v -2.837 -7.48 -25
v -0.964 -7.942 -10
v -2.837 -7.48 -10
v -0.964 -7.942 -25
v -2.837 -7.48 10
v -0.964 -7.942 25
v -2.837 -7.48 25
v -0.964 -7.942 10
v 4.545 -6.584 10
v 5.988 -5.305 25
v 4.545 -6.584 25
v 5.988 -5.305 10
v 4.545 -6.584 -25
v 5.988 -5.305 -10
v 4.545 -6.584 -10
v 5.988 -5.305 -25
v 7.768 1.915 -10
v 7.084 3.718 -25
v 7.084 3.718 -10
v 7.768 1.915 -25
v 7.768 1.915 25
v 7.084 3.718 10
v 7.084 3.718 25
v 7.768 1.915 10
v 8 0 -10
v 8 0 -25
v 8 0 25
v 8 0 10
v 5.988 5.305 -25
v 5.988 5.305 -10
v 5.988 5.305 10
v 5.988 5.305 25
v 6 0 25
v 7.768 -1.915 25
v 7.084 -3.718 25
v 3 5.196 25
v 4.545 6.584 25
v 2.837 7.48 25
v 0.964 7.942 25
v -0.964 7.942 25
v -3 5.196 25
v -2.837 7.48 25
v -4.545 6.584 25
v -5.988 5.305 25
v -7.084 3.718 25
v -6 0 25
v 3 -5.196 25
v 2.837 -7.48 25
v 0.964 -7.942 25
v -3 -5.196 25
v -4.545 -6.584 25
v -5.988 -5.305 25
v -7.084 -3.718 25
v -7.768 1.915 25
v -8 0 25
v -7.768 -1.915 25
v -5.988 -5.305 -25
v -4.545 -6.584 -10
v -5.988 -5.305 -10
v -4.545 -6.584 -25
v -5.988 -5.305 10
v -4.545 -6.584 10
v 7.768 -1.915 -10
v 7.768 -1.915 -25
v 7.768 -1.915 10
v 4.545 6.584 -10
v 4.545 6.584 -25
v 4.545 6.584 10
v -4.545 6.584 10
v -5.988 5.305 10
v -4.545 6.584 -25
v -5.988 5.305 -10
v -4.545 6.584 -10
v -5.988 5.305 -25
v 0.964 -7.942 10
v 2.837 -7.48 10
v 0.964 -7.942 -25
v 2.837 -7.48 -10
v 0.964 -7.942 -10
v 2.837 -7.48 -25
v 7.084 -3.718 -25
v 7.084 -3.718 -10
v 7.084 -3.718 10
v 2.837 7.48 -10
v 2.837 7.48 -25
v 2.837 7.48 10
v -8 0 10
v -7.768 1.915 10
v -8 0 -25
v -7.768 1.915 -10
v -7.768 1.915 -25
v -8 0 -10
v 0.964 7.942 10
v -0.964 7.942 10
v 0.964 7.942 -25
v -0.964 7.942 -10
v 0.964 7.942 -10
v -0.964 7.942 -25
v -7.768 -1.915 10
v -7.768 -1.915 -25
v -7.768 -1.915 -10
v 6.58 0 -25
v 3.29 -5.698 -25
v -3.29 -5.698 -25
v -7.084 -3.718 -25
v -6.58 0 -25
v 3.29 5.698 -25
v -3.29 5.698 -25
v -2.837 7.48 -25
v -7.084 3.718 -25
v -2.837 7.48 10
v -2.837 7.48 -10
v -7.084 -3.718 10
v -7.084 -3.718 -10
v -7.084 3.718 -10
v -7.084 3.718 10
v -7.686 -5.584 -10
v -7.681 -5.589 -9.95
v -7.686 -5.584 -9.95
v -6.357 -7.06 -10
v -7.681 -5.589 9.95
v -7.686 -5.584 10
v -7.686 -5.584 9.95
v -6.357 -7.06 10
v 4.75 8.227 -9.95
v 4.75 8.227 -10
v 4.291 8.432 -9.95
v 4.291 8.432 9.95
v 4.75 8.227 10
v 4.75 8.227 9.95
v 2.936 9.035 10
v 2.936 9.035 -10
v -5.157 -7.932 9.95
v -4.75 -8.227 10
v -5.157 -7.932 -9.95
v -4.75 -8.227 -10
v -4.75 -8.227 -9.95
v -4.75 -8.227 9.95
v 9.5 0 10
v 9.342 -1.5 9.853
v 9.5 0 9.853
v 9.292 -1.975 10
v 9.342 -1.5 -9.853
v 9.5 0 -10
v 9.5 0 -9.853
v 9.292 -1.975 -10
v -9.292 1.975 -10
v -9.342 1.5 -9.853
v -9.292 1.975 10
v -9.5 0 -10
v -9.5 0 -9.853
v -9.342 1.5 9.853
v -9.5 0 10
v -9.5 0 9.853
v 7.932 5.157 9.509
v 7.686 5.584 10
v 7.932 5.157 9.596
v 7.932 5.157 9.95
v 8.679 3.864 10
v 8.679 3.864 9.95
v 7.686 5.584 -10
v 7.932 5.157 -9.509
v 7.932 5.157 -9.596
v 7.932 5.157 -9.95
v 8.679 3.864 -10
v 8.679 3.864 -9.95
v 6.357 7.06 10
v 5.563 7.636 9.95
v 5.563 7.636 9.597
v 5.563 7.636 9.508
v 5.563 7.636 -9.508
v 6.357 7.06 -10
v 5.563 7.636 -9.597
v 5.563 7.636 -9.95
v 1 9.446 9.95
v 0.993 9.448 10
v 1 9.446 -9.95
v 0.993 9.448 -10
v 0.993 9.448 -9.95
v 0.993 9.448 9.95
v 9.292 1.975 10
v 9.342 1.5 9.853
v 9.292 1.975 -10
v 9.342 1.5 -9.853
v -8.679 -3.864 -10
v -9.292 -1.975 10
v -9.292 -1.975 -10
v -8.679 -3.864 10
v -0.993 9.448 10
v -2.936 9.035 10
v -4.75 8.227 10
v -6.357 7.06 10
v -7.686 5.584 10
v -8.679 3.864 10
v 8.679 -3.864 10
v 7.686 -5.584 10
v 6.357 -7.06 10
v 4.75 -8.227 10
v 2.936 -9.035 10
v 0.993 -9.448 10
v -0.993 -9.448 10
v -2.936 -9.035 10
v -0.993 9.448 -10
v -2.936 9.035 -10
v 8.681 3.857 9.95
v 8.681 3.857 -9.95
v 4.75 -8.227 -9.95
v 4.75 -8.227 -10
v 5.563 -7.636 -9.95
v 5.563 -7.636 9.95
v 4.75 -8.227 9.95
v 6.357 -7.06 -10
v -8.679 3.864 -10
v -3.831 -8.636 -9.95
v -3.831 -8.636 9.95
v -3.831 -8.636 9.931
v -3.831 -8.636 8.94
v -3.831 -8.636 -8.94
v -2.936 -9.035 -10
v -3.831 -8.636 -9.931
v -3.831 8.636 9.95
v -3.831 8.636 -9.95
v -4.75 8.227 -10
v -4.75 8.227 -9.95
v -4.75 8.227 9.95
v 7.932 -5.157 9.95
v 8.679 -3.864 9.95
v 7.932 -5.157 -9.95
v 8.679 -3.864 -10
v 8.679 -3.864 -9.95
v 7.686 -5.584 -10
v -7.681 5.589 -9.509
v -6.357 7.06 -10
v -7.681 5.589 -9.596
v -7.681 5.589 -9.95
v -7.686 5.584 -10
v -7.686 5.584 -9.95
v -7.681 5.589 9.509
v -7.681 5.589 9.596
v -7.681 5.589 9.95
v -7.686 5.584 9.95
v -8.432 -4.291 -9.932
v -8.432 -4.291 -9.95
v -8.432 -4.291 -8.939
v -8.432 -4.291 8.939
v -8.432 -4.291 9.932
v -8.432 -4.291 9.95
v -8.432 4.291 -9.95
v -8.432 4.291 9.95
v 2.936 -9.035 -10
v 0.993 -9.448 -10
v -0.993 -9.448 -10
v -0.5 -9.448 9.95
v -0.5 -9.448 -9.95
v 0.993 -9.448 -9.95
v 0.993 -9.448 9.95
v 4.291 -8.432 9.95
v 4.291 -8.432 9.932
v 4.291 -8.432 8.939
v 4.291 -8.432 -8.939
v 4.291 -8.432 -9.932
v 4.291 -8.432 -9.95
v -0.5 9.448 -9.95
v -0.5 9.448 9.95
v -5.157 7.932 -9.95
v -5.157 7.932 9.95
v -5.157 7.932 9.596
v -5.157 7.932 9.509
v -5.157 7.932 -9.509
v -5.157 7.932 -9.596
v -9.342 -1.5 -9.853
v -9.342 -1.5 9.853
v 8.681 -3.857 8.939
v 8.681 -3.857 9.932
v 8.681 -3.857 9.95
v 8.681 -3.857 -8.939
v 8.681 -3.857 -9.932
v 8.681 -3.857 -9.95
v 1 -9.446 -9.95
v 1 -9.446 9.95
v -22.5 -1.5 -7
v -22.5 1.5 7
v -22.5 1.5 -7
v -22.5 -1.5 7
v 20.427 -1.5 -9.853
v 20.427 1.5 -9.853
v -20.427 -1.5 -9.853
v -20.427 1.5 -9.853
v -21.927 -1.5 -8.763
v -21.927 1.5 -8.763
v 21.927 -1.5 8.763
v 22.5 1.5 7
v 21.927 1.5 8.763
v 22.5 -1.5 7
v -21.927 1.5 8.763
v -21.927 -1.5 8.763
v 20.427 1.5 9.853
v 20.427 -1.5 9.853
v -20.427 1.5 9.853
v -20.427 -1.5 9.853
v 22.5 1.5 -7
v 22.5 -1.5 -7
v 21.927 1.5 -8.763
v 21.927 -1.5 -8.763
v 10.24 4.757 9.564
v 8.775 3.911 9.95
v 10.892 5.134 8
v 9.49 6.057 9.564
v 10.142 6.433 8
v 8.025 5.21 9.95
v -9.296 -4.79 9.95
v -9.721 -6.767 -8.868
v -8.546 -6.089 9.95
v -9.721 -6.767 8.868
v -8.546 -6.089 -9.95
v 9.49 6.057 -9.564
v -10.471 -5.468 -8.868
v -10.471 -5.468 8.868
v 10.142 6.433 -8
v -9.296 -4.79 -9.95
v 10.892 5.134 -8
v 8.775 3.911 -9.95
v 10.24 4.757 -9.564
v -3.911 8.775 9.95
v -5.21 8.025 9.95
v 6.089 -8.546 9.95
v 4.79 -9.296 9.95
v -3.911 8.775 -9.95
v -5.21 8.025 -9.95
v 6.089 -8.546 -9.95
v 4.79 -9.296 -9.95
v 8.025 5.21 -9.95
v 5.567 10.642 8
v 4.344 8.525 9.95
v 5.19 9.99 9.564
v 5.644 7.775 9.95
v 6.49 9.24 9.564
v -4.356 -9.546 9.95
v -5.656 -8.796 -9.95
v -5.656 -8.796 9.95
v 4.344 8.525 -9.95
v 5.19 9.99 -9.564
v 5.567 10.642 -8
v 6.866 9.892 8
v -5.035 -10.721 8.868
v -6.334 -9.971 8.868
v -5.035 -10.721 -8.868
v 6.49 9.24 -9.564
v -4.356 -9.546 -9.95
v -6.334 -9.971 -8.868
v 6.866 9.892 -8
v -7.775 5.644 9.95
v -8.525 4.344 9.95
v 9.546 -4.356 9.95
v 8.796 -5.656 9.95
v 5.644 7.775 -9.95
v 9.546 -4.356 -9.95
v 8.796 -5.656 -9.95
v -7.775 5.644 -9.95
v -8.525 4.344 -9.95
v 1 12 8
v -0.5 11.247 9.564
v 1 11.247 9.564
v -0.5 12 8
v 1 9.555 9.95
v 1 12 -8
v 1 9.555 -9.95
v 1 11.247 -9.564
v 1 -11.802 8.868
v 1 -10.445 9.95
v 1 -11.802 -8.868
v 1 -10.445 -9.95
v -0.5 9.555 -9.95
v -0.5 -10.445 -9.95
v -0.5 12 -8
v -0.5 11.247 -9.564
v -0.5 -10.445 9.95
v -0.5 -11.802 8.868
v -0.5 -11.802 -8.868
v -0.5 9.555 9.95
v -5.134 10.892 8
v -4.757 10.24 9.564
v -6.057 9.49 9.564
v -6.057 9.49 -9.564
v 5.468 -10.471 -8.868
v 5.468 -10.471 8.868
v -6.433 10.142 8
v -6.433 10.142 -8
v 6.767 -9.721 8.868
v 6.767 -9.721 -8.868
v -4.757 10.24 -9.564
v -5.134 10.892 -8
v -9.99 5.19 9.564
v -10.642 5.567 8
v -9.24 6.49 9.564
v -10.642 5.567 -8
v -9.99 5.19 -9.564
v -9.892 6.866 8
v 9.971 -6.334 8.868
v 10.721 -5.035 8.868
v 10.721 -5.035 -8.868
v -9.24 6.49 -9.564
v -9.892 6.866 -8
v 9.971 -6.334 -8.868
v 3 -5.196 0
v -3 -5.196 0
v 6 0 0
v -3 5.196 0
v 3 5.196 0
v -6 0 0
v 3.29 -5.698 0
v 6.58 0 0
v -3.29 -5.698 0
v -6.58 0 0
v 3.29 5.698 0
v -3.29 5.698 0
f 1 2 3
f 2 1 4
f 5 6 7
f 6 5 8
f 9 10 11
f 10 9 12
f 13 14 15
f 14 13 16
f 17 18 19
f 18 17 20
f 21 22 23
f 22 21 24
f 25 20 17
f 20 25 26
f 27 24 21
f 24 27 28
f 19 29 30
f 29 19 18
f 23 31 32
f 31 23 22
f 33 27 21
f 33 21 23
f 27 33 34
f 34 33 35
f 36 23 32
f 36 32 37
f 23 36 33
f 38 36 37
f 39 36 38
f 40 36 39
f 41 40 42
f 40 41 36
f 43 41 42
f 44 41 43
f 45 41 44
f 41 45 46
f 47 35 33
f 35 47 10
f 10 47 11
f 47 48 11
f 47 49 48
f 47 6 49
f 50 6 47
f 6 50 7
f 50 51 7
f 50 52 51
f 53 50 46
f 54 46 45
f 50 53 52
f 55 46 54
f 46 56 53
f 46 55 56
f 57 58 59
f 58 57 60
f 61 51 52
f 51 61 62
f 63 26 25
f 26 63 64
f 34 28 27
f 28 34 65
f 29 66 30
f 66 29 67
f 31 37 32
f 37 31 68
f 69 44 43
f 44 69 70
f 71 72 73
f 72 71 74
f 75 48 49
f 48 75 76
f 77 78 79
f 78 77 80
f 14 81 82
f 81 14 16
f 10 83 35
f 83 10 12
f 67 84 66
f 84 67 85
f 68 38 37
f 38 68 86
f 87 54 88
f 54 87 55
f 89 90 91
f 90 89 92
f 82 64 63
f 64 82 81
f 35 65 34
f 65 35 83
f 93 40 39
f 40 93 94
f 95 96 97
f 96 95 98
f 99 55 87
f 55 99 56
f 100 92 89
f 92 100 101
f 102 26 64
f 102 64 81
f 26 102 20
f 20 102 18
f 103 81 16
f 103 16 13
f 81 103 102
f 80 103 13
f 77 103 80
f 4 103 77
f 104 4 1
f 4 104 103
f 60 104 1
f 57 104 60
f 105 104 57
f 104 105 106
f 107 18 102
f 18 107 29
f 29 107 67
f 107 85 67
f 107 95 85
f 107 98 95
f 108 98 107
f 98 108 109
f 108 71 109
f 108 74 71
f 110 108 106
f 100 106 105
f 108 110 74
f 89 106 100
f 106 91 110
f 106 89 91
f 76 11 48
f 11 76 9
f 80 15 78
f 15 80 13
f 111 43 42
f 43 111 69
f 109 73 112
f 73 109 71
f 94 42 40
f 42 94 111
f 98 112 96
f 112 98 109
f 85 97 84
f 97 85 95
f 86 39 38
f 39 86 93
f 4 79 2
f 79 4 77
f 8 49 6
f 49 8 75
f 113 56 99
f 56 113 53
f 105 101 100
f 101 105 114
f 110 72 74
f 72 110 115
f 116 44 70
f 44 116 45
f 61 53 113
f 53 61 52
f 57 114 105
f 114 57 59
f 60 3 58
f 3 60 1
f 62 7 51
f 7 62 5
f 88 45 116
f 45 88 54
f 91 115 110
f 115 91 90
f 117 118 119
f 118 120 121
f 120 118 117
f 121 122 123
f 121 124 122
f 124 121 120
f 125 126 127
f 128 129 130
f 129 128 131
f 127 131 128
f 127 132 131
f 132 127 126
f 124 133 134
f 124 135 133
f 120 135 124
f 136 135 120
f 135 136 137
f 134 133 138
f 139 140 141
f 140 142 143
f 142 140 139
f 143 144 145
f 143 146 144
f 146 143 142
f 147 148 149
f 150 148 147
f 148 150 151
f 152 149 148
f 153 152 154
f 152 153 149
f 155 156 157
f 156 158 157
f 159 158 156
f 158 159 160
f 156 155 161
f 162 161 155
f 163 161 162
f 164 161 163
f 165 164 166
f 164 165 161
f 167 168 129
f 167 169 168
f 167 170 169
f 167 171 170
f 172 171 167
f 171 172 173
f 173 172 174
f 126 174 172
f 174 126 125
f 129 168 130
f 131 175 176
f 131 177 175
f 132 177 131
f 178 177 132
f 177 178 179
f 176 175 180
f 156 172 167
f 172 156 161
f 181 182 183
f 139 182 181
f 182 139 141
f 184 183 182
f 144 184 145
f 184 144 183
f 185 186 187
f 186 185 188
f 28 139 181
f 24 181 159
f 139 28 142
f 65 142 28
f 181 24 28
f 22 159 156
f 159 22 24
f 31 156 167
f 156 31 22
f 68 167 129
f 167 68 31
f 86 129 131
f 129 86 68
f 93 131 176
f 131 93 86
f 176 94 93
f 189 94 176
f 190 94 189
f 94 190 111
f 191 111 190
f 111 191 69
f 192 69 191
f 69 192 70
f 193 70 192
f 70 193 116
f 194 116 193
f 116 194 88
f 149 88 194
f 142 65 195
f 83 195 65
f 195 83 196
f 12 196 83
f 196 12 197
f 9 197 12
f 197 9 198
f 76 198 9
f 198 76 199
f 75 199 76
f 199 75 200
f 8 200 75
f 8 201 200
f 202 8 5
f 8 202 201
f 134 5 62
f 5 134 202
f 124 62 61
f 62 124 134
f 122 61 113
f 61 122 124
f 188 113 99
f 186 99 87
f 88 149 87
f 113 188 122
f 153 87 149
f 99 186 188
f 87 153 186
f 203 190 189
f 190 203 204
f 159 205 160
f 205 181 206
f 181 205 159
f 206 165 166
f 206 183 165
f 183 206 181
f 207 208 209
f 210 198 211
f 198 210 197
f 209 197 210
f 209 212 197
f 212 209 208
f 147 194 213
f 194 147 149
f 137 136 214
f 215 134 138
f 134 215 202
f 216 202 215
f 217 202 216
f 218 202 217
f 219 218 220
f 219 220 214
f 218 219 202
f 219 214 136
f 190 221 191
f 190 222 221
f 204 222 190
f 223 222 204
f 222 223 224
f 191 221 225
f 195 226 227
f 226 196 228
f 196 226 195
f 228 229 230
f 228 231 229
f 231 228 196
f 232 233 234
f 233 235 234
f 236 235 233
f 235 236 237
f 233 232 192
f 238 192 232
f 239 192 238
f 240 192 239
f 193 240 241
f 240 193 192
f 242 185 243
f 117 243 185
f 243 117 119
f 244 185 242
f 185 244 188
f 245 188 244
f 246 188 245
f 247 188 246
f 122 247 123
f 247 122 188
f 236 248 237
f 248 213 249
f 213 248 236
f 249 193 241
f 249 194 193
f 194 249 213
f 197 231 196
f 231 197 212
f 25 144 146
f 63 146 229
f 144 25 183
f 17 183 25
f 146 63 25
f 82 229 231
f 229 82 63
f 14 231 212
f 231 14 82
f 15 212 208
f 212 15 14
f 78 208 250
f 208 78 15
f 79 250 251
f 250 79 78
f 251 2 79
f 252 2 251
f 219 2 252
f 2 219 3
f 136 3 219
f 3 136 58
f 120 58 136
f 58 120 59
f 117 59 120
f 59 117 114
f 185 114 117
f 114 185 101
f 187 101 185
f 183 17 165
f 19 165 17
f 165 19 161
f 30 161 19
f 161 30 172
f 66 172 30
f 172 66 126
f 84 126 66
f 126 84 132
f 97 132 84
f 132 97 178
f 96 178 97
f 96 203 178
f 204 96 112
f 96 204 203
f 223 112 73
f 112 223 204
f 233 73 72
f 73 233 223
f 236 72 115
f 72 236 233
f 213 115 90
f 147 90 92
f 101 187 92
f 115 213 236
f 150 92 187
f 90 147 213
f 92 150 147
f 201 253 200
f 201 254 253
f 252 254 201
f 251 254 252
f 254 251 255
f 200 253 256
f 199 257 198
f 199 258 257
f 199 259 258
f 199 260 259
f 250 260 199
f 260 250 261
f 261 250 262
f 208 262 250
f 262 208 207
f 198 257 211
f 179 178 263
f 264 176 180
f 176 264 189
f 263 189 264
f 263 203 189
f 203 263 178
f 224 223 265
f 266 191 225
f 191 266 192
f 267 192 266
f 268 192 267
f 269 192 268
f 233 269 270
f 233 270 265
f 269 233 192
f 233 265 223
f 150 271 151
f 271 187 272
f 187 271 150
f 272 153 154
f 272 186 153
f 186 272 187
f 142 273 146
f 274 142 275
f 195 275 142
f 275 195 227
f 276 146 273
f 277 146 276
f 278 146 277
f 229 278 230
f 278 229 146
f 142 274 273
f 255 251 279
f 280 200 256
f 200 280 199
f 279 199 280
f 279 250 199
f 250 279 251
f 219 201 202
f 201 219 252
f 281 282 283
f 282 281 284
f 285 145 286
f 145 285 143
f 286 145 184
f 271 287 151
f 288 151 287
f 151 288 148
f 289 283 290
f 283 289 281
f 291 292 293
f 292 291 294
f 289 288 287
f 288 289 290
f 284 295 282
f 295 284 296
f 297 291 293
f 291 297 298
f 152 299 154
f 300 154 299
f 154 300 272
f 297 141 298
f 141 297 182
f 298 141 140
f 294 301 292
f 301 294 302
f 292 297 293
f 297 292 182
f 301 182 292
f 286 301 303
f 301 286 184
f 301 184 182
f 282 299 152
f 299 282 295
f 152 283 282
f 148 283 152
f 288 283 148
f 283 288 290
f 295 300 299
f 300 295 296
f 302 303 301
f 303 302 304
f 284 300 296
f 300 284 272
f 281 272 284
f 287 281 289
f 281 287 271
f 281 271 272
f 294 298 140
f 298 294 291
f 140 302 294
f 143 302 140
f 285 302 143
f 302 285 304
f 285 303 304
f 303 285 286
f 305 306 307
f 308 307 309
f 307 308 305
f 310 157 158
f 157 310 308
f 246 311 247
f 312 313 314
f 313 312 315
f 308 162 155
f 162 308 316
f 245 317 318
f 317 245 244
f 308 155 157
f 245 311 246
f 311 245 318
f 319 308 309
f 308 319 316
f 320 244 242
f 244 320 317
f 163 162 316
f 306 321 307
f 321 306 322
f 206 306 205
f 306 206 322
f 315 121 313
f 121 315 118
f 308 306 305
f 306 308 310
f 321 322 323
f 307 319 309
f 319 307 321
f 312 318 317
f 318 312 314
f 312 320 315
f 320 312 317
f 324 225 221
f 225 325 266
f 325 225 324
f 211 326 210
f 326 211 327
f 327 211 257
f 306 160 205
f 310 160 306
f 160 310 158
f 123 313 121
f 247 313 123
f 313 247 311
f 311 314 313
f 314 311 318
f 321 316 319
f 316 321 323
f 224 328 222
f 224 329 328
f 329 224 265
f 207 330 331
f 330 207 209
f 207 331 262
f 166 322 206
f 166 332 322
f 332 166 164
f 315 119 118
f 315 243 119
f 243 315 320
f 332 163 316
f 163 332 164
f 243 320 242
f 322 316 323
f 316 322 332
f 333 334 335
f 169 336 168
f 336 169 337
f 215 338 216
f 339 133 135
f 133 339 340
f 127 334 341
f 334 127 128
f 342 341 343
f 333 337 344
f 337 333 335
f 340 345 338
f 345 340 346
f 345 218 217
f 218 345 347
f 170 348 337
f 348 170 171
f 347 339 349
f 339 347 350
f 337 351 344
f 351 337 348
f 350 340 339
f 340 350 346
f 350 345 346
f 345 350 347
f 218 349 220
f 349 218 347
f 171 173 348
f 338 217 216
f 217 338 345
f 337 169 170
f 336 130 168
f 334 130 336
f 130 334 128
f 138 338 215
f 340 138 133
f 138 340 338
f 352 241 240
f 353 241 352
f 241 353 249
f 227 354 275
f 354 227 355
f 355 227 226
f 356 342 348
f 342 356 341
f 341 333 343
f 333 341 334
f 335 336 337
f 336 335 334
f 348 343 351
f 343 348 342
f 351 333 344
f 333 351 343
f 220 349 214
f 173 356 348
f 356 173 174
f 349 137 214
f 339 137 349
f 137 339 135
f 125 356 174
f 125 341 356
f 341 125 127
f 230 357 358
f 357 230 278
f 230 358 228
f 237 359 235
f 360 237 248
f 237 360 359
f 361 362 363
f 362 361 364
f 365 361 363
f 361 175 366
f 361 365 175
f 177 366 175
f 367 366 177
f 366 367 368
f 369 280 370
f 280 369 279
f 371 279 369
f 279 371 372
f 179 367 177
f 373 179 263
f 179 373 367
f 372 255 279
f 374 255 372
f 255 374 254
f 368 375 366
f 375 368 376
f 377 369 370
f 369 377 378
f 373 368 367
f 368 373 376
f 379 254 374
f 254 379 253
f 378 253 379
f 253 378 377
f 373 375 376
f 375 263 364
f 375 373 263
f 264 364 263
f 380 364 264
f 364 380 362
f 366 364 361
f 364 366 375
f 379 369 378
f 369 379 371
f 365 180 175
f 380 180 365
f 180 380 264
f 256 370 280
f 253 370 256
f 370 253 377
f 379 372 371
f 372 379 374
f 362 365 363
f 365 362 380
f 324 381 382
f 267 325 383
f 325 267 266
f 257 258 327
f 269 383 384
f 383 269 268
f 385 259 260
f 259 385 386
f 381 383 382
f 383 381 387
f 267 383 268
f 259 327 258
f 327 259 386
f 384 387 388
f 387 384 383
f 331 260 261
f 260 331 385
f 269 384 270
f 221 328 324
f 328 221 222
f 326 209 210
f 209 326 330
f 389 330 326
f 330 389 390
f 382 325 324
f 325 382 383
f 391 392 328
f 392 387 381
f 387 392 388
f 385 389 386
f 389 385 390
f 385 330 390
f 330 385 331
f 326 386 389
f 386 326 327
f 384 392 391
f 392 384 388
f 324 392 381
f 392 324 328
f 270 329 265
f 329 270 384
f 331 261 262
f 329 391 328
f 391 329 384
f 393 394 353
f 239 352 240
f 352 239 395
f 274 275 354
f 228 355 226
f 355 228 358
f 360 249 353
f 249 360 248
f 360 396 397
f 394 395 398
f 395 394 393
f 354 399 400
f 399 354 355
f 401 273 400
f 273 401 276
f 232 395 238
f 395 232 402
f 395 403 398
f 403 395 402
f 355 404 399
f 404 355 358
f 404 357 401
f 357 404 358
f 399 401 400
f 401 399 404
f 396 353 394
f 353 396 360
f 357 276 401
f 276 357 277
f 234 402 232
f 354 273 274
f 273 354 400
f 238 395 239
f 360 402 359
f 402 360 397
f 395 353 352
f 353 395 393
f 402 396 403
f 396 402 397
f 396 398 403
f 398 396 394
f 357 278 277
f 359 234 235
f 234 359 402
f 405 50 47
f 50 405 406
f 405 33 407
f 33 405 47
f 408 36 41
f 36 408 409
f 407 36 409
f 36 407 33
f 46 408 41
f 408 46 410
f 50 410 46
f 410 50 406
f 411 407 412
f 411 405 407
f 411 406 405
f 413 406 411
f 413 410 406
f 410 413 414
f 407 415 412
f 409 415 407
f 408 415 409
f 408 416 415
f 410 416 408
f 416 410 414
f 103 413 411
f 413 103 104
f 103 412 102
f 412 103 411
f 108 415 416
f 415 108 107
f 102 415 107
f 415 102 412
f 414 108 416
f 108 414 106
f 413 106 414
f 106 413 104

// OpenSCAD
/**
 * MIT License
 *
 * Copyright (c) 2026 Adam Kuczyński
 *
 * Permission is hereby granted, free of charge, to any person obtaining a copy
 * of this software and associated documentation files (the "Software"), to deal
 * in the Software without restriction, including without limitation the rights
 * to use, copy, modify, merge, publish, distribute, sublicense, and/or sell
 * copies of the Software, and to permit persons to whom the Software is
 * furnished to do so, subject to the following conditions:
 *
 * The above copyright notice and this permission notice shall be included in all
 * copies or substantial portions of the Software.
 *
 * THE SOFTWARE IS PROVIDED "AS IS", WITHOUT WARRANTY OF ANY KIND, EXPRESS OR
 * IMPLIED, INCLUDING BUT NOT LIMITED TO THE WARRANTIES OF MERCHANTABILITY,
 * FITNESS FOR A PARTICULAR PURPOSE AND NONINFRINGEMENT. IN NO EVENT SHALL THE
 * AUTHORS OR COPYRIGHT HOLDERS BE LIABLE FOR ANY CLAIM, DAMAGES OR OTHER
 * LIABILITY, WHETHER IN AN ACTION OF CONTRACT, TORT OR OTHERWISE, ARISING FROM,
 * OUT OF OR IN CONNECTION WITH THE SOFTWARE OR THE USE OR OTHER DEALINGS IN THE
 * SOFTWARE.
 */

difference() {
    union($fn = 100) {
        cylinder(h = 50, d = 16, center = true);
        cylinder(h = 20, d = 19, center = true);
        minkowski() {
            cube([39, 1, 14], center = true);
            rotate([90, 0, 0])
                cylinder(h = 2, r = 3, center = true);
        }
        rotate([0, 0, 30]) rib();
        rotate([0, 0, 60]) rib();
        rotate([0, 0, 90]) rib();
        rotate([0, 0, 120]) rib();
        rotate([0, 0, 150]) rib();
    }
    translate([0, 0, 25]) hex(10);
    translate([0, 0, -25]) hex(11);
}

module rib() {
    minkowski() {
        cube([20, 1, 16], center = true);
        rotate([90, 0, 0])
            cylinder(h = 0.5, r = 2);
    }
}

module hex(m) {
  // 2 * a * tan(180 / edge_count)
  // m = 2 * a
  // edge_count = 6
  // tan(180 / 6) = tan(30) = sqrt(1) / sqrt(3) = ~0.58
  // 0.2 - just a bit extra to account for imperfections
  r = m * 0.58 + 0.2;
  cylinder(h = 50, r = r, $fn = 6, center = true);  
}
